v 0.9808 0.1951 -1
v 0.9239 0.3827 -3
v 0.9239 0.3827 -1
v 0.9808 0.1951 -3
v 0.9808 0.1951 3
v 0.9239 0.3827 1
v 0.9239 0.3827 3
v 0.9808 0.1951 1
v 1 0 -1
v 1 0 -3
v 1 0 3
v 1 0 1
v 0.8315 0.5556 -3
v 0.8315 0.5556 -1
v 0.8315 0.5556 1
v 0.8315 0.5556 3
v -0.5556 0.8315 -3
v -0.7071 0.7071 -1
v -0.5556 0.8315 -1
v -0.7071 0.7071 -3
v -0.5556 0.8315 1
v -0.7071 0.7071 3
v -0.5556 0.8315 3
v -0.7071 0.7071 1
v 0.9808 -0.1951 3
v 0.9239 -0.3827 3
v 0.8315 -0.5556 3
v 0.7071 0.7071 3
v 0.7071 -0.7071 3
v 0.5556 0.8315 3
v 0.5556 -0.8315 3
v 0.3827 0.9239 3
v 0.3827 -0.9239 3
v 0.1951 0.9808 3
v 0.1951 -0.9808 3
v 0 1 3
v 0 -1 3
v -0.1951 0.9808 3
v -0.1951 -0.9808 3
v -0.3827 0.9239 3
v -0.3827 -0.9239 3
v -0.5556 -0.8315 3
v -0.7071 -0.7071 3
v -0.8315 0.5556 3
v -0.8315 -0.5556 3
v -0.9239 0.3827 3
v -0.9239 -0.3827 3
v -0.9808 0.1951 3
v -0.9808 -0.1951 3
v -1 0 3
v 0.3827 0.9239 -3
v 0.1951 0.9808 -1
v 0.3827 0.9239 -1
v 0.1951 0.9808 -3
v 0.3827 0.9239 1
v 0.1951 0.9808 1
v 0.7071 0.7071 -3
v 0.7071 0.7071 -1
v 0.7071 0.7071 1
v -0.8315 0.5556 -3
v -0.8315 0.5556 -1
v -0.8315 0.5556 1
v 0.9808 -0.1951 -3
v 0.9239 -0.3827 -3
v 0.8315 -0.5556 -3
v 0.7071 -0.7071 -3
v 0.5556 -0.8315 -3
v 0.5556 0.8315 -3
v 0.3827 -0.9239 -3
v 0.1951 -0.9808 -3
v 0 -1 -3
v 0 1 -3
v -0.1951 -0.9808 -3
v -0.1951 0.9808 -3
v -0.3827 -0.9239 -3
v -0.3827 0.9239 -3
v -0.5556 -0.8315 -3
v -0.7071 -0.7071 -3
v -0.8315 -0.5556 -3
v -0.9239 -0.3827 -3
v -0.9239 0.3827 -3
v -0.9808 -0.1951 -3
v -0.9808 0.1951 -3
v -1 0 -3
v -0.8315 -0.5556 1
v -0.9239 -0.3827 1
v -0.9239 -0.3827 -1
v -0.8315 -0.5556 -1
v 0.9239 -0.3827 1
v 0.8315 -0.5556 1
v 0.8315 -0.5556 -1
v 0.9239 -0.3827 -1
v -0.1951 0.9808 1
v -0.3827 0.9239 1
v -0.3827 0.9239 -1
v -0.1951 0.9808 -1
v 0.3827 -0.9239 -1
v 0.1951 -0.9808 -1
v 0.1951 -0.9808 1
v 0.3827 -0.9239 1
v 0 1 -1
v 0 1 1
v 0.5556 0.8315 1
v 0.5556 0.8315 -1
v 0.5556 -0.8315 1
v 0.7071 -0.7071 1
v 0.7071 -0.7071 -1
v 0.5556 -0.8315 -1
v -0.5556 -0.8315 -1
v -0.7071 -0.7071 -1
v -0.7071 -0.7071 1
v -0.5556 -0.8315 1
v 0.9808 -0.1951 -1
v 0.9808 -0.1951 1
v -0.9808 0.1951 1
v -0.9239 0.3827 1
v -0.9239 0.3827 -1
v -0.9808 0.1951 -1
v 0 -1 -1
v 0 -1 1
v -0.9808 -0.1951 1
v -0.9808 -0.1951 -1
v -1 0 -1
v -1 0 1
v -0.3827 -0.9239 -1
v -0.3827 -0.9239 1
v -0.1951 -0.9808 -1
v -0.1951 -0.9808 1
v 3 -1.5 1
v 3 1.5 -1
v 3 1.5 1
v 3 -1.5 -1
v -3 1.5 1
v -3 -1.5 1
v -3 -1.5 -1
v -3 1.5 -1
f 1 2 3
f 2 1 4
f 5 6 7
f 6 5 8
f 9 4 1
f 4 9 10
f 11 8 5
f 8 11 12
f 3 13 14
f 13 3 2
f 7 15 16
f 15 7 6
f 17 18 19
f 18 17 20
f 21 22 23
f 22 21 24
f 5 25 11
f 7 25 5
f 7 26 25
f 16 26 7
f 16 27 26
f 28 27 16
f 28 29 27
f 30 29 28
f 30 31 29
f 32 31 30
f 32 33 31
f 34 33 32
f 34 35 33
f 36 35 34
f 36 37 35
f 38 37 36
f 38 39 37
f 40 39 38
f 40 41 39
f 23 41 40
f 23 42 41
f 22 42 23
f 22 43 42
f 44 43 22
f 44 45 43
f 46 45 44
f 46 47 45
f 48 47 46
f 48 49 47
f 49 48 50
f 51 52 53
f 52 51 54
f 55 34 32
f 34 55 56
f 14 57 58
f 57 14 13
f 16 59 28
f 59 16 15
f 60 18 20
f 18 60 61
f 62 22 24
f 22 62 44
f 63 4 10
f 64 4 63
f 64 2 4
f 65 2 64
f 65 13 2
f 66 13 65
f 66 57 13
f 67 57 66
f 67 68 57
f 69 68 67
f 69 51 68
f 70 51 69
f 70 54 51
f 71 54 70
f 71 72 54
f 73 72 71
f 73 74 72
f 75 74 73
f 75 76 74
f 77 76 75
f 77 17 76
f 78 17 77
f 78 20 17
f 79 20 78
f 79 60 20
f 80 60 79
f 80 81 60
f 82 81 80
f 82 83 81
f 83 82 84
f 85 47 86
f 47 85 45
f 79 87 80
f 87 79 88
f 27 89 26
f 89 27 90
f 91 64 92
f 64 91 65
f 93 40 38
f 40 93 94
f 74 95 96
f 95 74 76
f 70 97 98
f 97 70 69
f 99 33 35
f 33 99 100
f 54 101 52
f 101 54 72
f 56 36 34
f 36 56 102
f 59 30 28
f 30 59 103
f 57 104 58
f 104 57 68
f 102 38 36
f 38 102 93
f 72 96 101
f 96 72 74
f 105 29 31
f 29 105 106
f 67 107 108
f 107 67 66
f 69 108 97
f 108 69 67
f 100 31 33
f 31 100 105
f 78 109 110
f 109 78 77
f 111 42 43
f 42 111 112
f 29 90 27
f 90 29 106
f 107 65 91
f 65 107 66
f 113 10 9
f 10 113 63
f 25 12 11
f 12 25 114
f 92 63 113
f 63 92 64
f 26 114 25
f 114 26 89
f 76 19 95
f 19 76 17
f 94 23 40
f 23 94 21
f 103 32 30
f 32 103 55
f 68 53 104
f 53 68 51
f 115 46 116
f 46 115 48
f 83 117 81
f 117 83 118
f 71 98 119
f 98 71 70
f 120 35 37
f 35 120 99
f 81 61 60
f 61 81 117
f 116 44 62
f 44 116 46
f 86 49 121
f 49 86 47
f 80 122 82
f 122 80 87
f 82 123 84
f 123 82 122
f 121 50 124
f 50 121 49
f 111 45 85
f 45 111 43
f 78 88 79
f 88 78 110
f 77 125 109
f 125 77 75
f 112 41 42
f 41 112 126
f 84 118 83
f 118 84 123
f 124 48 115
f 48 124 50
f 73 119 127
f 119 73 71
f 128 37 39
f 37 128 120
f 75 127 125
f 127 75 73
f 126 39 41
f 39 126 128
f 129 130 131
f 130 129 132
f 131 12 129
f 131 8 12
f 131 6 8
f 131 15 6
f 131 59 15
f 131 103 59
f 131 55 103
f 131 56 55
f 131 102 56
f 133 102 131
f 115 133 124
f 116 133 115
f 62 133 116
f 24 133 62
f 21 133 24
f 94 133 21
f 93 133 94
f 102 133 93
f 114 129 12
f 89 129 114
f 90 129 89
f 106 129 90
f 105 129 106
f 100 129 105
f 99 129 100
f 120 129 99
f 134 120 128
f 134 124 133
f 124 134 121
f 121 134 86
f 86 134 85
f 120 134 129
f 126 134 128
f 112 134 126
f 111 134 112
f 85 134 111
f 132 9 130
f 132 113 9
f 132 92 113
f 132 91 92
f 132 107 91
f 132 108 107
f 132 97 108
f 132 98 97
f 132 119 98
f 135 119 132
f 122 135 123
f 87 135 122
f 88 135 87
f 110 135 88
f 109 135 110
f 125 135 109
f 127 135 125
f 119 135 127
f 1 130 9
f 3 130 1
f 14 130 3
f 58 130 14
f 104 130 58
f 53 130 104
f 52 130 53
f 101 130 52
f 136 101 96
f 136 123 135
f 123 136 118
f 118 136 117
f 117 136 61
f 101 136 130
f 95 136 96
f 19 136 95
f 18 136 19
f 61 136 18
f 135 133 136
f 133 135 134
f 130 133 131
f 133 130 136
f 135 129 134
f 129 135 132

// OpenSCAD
// 6mmx3mm cube
// 2mm pin

cylinder(d=2, h=6, center=true, $fn=32);
cube([6,3,2], center=true);
